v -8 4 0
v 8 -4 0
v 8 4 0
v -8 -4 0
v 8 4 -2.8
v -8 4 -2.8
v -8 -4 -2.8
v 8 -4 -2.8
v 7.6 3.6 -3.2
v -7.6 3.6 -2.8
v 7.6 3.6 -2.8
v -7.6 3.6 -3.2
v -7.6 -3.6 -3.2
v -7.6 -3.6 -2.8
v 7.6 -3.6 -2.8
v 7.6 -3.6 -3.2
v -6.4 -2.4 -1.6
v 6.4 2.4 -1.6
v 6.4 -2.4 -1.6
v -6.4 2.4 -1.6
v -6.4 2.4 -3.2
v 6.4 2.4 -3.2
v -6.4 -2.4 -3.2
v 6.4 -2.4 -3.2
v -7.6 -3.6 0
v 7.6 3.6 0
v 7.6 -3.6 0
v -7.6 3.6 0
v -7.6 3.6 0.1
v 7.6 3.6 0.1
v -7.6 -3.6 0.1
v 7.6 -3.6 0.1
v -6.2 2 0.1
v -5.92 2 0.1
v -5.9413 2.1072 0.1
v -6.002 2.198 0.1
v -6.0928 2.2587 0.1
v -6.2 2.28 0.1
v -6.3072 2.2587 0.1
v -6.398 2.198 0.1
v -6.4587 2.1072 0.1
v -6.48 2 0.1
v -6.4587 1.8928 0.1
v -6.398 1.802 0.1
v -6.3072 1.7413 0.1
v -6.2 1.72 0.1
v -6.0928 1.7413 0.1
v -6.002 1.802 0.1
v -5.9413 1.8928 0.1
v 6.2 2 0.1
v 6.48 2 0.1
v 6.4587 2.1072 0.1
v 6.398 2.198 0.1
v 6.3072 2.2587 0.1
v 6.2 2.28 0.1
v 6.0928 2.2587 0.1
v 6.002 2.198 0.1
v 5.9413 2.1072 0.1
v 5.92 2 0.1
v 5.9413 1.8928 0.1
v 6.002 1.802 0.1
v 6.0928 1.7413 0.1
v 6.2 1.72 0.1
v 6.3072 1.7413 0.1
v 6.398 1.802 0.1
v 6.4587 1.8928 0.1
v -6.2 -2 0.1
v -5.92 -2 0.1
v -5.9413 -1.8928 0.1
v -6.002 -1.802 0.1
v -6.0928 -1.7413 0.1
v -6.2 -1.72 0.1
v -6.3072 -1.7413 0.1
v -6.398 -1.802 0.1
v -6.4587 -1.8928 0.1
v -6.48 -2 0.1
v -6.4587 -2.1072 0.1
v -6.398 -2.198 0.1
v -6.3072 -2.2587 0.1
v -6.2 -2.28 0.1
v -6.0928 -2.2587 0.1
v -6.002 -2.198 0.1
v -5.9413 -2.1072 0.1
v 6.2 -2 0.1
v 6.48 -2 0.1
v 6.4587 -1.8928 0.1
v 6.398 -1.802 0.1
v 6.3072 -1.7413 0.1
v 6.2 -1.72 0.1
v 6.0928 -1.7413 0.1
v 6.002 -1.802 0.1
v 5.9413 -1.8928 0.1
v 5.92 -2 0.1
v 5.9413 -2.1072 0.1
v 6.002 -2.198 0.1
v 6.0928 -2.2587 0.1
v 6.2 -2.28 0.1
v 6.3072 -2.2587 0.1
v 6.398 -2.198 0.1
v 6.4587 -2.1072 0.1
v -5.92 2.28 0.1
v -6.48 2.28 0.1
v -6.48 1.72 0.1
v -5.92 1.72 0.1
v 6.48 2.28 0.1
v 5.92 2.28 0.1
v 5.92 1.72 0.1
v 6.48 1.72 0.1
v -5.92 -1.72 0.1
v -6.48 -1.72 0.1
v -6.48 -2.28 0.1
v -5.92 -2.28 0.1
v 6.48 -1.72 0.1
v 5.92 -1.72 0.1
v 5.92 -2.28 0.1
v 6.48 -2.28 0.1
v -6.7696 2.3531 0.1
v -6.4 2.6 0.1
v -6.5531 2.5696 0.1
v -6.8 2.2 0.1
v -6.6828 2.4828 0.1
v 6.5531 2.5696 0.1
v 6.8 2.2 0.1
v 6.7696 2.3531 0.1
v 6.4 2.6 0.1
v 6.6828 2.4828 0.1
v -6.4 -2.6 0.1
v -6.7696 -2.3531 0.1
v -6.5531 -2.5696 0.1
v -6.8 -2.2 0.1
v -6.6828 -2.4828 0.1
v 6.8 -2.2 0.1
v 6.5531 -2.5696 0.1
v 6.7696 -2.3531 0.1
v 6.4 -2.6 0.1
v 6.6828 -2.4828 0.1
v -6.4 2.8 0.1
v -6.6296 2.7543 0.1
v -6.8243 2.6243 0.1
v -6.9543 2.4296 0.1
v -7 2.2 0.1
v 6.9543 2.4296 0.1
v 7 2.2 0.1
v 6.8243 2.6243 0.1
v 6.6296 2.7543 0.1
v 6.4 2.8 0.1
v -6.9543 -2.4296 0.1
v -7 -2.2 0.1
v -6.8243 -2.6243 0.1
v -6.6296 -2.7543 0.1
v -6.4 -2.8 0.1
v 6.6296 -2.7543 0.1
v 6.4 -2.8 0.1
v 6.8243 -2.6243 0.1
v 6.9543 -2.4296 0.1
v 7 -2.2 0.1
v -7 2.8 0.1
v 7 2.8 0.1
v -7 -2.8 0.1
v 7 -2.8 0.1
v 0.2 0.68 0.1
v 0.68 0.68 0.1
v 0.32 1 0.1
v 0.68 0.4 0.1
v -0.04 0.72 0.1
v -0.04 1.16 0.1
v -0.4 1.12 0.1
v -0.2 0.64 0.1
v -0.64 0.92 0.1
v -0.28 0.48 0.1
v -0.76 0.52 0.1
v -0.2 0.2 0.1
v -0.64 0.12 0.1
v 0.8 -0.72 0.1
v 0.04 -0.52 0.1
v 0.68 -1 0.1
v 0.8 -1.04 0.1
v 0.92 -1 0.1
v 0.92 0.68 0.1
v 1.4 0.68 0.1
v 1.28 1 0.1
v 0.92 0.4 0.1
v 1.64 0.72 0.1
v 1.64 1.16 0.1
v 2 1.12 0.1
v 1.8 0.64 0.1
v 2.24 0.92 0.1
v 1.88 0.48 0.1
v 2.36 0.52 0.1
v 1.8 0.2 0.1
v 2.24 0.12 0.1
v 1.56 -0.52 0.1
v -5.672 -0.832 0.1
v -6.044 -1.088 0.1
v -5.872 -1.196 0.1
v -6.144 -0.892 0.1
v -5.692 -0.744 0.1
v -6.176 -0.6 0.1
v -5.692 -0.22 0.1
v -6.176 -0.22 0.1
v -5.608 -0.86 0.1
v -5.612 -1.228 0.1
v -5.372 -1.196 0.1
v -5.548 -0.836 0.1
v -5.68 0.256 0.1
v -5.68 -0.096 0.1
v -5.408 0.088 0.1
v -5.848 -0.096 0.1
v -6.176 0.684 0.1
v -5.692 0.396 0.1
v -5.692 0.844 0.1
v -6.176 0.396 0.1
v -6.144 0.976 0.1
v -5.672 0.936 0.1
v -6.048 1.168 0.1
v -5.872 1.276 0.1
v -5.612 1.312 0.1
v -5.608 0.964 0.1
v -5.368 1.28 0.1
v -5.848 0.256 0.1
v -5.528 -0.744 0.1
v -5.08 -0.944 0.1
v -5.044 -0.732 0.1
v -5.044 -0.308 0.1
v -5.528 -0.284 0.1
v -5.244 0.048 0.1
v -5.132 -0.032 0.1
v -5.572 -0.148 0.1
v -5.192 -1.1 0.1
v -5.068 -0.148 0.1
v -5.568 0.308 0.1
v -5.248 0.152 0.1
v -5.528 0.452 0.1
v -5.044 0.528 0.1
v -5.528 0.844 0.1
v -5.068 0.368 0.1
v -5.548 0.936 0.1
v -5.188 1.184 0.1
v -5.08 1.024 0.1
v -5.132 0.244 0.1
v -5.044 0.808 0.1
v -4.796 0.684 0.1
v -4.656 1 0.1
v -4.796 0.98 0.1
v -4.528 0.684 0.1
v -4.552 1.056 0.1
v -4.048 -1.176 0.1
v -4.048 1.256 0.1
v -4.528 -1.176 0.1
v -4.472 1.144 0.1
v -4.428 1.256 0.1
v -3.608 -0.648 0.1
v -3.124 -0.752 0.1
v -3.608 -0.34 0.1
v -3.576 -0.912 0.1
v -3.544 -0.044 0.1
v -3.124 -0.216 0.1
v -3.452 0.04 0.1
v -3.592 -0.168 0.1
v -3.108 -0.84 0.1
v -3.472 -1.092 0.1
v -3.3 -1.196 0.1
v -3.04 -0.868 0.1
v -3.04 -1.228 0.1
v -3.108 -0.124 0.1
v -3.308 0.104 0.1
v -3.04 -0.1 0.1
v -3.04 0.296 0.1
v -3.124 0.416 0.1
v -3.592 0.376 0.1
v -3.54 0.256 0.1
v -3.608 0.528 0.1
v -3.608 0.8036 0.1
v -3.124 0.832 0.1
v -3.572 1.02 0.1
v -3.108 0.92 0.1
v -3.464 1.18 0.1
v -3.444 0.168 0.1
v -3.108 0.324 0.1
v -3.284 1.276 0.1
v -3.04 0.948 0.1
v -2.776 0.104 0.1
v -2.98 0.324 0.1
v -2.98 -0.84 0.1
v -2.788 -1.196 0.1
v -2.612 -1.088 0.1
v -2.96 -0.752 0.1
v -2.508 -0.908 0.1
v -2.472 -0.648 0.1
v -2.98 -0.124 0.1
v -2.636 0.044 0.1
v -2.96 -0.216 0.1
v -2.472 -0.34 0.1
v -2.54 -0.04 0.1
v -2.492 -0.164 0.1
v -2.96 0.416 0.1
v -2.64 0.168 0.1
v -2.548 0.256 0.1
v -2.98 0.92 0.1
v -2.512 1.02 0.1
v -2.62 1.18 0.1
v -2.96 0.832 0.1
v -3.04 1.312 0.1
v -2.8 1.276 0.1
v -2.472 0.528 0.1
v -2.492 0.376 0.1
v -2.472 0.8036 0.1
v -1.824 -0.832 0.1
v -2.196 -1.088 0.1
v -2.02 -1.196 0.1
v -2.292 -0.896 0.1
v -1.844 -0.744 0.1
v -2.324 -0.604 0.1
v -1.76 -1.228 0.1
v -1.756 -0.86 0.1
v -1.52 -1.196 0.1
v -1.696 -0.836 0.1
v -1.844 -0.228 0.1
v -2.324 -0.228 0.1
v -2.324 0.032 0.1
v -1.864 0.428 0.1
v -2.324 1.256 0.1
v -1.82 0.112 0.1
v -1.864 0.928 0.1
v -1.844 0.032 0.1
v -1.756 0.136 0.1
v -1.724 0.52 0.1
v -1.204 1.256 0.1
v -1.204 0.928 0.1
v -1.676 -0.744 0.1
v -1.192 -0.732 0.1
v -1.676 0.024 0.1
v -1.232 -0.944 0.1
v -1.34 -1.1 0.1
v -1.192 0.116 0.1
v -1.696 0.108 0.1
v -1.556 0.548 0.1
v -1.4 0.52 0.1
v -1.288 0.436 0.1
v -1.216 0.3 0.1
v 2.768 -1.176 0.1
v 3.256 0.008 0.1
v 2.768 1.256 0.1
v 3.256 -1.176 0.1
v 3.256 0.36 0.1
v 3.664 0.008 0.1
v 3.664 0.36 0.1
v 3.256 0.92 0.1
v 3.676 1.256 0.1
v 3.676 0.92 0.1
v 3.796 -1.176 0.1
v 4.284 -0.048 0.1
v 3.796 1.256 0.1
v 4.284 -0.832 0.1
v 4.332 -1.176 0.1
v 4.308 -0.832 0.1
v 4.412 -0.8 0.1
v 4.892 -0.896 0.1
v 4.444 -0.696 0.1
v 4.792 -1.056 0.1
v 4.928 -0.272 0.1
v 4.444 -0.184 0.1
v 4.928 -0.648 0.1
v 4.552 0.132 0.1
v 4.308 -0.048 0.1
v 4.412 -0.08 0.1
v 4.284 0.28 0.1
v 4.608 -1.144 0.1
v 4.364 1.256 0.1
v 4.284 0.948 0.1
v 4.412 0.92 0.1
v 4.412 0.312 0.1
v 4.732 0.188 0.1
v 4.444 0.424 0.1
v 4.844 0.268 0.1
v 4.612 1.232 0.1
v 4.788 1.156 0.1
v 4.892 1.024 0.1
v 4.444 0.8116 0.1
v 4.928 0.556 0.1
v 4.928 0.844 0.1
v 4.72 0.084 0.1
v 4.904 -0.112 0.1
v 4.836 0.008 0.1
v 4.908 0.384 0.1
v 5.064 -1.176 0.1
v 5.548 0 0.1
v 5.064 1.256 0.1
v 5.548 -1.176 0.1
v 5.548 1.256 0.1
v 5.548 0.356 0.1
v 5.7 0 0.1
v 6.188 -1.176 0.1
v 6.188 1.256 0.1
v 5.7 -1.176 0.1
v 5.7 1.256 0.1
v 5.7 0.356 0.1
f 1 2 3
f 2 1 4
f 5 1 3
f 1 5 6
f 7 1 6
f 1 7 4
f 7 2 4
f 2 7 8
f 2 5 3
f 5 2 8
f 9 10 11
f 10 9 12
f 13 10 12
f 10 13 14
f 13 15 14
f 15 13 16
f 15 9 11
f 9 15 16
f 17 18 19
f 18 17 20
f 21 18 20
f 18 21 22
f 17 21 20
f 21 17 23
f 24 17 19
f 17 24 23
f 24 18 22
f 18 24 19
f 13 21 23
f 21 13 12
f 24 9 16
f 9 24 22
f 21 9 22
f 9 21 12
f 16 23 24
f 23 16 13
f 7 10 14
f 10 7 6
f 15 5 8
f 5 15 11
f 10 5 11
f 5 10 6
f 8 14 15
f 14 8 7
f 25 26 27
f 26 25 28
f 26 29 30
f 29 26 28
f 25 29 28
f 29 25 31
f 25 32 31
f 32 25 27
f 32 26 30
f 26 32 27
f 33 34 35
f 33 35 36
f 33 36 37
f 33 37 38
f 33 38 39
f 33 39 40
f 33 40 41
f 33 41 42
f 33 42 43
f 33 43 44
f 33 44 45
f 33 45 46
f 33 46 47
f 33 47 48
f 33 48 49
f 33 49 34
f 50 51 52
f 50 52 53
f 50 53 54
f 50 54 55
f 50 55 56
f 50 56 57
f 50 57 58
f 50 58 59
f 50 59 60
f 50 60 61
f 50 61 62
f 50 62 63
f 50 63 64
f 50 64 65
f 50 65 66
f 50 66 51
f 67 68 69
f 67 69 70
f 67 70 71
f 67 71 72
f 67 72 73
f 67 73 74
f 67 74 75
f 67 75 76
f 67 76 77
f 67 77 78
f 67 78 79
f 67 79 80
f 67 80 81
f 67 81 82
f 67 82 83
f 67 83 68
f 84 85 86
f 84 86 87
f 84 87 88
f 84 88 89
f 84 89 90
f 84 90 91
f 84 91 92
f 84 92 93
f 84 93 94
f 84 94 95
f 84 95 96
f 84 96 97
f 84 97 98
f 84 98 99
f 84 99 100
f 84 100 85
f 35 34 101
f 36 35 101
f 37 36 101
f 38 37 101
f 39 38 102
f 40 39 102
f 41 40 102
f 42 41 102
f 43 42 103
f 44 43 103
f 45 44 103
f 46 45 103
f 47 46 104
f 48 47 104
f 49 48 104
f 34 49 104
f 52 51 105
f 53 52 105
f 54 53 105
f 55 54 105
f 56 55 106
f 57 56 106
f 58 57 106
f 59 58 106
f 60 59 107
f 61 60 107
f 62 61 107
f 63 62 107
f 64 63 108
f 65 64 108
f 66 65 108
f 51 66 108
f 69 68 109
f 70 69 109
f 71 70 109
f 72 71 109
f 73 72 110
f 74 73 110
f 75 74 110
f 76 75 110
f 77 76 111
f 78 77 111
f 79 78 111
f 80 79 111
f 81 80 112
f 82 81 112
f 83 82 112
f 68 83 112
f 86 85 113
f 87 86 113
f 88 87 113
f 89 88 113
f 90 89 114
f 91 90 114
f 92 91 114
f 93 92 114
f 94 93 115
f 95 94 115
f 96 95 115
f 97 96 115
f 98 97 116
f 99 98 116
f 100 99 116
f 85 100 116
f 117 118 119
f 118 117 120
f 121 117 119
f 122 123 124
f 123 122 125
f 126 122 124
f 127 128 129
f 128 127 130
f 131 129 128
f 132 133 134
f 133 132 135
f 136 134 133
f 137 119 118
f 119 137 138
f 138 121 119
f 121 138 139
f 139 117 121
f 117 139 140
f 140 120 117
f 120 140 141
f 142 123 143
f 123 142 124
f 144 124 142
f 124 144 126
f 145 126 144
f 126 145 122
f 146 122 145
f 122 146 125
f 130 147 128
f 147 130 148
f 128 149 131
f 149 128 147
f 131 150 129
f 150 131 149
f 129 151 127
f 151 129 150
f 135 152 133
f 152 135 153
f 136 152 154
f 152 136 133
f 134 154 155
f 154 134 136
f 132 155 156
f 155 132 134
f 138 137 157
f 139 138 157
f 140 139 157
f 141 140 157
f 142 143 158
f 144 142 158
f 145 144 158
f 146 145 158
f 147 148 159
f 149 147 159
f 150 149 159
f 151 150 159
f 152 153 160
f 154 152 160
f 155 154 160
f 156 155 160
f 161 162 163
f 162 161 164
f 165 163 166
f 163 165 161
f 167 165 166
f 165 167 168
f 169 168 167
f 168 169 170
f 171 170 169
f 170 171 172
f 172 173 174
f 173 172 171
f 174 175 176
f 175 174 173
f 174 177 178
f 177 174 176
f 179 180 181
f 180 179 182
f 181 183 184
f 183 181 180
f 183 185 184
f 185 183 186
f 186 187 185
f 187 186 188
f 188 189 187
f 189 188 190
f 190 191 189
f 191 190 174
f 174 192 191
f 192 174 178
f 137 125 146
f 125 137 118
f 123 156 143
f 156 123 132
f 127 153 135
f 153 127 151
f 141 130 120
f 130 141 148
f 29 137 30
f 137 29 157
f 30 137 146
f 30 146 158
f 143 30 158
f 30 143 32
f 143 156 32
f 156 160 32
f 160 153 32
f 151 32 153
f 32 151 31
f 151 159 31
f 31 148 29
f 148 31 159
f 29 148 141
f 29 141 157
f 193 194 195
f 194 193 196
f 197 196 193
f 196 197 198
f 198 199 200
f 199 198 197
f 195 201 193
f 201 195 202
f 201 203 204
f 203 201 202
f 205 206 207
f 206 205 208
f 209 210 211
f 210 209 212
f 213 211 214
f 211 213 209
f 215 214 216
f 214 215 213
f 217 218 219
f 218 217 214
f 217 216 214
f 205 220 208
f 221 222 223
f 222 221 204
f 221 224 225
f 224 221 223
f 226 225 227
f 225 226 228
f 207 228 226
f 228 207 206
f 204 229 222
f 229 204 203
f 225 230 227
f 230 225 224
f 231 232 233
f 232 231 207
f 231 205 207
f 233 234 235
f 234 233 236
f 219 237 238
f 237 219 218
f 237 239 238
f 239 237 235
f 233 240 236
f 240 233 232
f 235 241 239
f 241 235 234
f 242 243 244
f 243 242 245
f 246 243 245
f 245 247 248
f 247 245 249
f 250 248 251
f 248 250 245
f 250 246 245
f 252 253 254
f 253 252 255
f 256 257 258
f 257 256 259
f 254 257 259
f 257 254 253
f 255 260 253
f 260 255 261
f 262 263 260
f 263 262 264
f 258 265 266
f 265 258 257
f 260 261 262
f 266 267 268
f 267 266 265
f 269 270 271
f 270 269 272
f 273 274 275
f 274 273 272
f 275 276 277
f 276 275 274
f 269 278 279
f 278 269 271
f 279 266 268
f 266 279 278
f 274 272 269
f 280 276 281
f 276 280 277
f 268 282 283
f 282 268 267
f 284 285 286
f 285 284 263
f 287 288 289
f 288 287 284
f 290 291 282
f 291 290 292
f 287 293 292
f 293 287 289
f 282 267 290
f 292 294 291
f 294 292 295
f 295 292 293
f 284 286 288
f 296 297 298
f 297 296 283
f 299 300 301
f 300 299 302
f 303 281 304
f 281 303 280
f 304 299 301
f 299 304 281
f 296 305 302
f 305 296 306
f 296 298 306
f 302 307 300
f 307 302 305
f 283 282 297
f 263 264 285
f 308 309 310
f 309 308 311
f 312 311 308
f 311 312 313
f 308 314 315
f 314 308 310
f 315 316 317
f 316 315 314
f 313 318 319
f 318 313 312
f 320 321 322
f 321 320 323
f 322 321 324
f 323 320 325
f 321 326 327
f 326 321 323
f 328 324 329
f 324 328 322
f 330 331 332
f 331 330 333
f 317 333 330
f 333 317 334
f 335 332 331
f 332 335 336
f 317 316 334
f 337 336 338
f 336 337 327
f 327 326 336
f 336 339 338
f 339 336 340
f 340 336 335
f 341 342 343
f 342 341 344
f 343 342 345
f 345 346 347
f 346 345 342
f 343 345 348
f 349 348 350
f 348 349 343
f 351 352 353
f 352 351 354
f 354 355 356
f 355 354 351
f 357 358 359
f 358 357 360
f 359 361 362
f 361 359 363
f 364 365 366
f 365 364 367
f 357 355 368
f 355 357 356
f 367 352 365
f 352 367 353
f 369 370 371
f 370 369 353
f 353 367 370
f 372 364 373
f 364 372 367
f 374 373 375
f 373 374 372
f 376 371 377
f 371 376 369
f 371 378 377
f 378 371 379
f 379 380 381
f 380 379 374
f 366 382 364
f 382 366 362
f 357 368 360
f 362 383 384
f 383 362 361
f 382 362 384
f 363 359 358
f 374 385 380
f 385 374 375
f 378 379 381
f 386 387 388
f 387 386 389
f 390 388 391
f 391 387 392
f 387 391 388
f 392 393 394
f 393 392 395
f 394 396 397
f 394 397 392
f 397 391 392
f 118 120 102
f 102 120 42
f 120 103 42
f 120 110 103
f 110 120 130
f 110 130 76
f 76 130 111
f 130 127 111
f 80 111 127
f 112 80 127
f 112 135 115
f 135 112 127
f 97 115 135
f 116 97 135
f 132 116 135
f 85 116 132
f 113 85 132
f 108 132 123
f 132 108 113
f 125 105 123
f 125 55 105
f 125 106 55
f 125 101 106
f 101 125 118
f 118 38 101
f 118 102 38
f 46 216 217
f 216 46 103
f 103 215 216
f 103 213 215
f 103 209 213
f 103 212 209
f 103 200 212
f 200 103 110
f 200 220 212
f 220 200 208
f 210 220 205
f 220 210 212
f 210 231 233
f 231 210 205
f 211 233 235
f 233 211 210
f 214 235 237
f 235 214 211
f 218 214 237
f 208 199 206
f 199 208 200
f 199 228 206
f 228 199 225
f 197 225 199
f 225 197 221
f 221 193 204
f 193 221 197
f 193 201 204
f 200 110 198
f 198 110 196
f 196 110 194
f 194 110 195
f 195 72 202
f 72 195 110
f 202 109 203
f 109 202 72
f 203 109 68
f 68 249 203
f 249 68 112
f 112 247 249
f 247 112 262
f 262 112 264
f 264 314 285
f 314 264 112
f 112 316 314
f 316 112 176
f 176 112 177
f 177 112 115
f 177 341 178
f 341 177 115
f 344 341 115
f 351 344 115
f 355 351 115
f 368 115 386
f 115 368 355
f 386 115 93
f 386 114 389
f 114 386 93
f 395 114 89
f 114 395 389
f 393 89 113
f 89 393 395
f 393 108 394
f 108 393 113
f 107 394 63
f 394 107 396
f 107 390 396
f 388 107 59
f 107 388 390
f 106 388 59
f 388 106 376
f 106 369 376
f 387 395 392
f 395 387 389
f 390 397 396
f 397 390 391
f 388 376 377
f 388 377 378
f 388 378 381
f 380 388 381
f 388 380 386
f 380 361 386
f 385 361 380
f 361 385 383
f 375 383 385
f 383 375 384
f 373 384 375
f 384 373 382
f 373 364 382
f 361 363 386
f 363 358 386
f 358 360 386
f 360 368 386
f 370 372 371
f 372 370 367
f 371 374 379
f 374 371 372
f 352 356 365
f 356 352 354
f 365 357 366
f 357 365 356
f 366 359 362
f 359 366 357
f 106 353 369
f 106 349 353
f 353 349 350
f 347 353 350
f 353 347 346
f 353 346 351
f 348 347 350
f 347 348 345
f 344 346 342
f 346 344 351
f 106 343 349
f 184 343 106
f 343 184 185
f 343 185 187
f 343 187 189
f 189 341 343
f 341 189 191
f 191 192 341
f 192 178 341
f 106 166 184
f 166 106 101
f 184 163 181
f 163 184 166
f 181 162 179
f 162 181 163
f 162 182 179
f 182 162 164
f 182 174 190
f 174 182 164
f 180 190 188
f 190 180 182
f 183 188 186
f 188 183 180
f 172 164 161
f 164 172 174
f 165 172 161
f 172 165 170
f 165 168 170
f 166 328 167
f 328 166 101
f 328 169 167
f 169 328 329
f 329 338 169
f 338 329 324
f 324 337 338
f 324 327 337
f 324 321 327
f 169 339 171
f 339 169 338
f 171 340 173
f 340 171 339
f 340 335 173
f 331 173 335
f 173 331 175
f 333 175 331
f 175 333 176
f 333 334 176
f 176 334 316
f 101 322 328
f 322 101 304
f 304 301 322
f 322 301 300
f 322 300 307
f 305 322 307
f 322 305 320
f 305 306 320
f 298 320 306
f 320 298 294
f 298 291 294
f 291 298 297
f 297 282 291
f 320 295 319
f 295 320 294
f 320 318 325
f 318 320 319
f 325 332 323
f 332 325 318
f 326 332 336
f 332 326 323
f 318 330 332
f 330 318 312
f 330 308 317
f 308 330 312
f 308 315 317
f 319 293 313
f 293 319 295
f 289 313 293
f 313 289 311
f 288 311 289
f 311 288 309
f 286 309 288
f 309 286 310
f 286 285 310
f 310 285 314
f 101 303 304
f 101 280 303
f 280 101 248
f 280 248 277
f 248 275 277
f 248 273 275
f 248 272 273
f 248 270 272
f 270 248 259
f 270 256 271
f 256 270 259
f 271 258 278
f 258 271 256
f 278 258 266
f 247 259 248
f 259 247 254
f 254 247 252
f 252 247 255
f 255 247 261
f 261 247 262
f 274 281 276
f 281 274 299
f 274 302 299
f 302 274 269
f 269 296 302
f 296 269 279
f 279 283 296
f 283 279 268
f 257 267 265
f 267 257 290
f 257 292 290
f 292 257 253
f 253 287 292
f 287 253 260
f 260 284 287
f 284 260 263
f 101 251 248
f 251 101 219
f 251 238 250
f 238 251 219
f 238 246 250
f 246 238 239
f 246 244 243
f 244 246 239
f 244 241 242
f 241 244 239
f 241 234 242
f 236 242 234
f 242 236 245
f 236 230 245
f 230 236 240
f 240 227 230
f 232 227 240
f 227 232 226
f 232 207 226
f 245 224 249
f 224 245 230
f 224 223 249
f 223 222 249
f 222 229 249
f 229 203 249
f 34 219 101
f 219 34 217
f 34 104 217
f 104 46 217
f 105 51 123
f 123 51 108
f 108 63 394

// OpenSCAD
use <../lib.scad>
use <3069b.scad>
use <4650854k.scad>
function ldraw_lib__3069bdf3() = [
// 0 Tile  1 x  2 with Bright Pink Heart and "3185 FBH" License Plate Sticker
// 0 Name: 3069bdf3.dat
// 0 Author: Takeshi Takahashi [RainbowDolphin]
// 0 !LDRAW_ORG Shortcut UPDATE 2024-09
// 0 !LICENSE Licensed under CC BY 4.0 : see CAreadme.txt
// 
// 0 BFC CERTIFY CCW
  [0,"BFC","CERTIFY"],
  [0,"BFC","CCW"],
// 
// 0 !CATEGORY Sticker Shortcut
// 0 !KEYWORDS Bricklink 3069pb0290, Bus, Friends, Set 3185, Summer riding camp
// 
// 0 !HISTORY 2024-10-27 [OrionP] Official Update 2024-09
// 
// 1 16 0 0 0 1 0 0 0 1 0 0 0 1 3069b.dat
  [1,16,0,0,0,1,0,0,0,1,0,0,0,1, ldraw_lib__3069b()],
// 1 16 0 0 0 1 0 0 0 1 0 0 0 1 4650854k.dat
  [1,16,0,0,0,1,0,0,0,1,0,0,0,1, ldraw_lib__4650854k()],
];
module ldraw_lib__3069bdf3(step=0, col=false, unit=2/5, alt=false, line=0.2, solid=!$preview)
    makepoly(ldraw_lib__3069bdf3(), step=step, col=col, unit=unit, alt=alt, line=line, solid=solid);
ldraw_lib__3069bdf3(line=0.2);
